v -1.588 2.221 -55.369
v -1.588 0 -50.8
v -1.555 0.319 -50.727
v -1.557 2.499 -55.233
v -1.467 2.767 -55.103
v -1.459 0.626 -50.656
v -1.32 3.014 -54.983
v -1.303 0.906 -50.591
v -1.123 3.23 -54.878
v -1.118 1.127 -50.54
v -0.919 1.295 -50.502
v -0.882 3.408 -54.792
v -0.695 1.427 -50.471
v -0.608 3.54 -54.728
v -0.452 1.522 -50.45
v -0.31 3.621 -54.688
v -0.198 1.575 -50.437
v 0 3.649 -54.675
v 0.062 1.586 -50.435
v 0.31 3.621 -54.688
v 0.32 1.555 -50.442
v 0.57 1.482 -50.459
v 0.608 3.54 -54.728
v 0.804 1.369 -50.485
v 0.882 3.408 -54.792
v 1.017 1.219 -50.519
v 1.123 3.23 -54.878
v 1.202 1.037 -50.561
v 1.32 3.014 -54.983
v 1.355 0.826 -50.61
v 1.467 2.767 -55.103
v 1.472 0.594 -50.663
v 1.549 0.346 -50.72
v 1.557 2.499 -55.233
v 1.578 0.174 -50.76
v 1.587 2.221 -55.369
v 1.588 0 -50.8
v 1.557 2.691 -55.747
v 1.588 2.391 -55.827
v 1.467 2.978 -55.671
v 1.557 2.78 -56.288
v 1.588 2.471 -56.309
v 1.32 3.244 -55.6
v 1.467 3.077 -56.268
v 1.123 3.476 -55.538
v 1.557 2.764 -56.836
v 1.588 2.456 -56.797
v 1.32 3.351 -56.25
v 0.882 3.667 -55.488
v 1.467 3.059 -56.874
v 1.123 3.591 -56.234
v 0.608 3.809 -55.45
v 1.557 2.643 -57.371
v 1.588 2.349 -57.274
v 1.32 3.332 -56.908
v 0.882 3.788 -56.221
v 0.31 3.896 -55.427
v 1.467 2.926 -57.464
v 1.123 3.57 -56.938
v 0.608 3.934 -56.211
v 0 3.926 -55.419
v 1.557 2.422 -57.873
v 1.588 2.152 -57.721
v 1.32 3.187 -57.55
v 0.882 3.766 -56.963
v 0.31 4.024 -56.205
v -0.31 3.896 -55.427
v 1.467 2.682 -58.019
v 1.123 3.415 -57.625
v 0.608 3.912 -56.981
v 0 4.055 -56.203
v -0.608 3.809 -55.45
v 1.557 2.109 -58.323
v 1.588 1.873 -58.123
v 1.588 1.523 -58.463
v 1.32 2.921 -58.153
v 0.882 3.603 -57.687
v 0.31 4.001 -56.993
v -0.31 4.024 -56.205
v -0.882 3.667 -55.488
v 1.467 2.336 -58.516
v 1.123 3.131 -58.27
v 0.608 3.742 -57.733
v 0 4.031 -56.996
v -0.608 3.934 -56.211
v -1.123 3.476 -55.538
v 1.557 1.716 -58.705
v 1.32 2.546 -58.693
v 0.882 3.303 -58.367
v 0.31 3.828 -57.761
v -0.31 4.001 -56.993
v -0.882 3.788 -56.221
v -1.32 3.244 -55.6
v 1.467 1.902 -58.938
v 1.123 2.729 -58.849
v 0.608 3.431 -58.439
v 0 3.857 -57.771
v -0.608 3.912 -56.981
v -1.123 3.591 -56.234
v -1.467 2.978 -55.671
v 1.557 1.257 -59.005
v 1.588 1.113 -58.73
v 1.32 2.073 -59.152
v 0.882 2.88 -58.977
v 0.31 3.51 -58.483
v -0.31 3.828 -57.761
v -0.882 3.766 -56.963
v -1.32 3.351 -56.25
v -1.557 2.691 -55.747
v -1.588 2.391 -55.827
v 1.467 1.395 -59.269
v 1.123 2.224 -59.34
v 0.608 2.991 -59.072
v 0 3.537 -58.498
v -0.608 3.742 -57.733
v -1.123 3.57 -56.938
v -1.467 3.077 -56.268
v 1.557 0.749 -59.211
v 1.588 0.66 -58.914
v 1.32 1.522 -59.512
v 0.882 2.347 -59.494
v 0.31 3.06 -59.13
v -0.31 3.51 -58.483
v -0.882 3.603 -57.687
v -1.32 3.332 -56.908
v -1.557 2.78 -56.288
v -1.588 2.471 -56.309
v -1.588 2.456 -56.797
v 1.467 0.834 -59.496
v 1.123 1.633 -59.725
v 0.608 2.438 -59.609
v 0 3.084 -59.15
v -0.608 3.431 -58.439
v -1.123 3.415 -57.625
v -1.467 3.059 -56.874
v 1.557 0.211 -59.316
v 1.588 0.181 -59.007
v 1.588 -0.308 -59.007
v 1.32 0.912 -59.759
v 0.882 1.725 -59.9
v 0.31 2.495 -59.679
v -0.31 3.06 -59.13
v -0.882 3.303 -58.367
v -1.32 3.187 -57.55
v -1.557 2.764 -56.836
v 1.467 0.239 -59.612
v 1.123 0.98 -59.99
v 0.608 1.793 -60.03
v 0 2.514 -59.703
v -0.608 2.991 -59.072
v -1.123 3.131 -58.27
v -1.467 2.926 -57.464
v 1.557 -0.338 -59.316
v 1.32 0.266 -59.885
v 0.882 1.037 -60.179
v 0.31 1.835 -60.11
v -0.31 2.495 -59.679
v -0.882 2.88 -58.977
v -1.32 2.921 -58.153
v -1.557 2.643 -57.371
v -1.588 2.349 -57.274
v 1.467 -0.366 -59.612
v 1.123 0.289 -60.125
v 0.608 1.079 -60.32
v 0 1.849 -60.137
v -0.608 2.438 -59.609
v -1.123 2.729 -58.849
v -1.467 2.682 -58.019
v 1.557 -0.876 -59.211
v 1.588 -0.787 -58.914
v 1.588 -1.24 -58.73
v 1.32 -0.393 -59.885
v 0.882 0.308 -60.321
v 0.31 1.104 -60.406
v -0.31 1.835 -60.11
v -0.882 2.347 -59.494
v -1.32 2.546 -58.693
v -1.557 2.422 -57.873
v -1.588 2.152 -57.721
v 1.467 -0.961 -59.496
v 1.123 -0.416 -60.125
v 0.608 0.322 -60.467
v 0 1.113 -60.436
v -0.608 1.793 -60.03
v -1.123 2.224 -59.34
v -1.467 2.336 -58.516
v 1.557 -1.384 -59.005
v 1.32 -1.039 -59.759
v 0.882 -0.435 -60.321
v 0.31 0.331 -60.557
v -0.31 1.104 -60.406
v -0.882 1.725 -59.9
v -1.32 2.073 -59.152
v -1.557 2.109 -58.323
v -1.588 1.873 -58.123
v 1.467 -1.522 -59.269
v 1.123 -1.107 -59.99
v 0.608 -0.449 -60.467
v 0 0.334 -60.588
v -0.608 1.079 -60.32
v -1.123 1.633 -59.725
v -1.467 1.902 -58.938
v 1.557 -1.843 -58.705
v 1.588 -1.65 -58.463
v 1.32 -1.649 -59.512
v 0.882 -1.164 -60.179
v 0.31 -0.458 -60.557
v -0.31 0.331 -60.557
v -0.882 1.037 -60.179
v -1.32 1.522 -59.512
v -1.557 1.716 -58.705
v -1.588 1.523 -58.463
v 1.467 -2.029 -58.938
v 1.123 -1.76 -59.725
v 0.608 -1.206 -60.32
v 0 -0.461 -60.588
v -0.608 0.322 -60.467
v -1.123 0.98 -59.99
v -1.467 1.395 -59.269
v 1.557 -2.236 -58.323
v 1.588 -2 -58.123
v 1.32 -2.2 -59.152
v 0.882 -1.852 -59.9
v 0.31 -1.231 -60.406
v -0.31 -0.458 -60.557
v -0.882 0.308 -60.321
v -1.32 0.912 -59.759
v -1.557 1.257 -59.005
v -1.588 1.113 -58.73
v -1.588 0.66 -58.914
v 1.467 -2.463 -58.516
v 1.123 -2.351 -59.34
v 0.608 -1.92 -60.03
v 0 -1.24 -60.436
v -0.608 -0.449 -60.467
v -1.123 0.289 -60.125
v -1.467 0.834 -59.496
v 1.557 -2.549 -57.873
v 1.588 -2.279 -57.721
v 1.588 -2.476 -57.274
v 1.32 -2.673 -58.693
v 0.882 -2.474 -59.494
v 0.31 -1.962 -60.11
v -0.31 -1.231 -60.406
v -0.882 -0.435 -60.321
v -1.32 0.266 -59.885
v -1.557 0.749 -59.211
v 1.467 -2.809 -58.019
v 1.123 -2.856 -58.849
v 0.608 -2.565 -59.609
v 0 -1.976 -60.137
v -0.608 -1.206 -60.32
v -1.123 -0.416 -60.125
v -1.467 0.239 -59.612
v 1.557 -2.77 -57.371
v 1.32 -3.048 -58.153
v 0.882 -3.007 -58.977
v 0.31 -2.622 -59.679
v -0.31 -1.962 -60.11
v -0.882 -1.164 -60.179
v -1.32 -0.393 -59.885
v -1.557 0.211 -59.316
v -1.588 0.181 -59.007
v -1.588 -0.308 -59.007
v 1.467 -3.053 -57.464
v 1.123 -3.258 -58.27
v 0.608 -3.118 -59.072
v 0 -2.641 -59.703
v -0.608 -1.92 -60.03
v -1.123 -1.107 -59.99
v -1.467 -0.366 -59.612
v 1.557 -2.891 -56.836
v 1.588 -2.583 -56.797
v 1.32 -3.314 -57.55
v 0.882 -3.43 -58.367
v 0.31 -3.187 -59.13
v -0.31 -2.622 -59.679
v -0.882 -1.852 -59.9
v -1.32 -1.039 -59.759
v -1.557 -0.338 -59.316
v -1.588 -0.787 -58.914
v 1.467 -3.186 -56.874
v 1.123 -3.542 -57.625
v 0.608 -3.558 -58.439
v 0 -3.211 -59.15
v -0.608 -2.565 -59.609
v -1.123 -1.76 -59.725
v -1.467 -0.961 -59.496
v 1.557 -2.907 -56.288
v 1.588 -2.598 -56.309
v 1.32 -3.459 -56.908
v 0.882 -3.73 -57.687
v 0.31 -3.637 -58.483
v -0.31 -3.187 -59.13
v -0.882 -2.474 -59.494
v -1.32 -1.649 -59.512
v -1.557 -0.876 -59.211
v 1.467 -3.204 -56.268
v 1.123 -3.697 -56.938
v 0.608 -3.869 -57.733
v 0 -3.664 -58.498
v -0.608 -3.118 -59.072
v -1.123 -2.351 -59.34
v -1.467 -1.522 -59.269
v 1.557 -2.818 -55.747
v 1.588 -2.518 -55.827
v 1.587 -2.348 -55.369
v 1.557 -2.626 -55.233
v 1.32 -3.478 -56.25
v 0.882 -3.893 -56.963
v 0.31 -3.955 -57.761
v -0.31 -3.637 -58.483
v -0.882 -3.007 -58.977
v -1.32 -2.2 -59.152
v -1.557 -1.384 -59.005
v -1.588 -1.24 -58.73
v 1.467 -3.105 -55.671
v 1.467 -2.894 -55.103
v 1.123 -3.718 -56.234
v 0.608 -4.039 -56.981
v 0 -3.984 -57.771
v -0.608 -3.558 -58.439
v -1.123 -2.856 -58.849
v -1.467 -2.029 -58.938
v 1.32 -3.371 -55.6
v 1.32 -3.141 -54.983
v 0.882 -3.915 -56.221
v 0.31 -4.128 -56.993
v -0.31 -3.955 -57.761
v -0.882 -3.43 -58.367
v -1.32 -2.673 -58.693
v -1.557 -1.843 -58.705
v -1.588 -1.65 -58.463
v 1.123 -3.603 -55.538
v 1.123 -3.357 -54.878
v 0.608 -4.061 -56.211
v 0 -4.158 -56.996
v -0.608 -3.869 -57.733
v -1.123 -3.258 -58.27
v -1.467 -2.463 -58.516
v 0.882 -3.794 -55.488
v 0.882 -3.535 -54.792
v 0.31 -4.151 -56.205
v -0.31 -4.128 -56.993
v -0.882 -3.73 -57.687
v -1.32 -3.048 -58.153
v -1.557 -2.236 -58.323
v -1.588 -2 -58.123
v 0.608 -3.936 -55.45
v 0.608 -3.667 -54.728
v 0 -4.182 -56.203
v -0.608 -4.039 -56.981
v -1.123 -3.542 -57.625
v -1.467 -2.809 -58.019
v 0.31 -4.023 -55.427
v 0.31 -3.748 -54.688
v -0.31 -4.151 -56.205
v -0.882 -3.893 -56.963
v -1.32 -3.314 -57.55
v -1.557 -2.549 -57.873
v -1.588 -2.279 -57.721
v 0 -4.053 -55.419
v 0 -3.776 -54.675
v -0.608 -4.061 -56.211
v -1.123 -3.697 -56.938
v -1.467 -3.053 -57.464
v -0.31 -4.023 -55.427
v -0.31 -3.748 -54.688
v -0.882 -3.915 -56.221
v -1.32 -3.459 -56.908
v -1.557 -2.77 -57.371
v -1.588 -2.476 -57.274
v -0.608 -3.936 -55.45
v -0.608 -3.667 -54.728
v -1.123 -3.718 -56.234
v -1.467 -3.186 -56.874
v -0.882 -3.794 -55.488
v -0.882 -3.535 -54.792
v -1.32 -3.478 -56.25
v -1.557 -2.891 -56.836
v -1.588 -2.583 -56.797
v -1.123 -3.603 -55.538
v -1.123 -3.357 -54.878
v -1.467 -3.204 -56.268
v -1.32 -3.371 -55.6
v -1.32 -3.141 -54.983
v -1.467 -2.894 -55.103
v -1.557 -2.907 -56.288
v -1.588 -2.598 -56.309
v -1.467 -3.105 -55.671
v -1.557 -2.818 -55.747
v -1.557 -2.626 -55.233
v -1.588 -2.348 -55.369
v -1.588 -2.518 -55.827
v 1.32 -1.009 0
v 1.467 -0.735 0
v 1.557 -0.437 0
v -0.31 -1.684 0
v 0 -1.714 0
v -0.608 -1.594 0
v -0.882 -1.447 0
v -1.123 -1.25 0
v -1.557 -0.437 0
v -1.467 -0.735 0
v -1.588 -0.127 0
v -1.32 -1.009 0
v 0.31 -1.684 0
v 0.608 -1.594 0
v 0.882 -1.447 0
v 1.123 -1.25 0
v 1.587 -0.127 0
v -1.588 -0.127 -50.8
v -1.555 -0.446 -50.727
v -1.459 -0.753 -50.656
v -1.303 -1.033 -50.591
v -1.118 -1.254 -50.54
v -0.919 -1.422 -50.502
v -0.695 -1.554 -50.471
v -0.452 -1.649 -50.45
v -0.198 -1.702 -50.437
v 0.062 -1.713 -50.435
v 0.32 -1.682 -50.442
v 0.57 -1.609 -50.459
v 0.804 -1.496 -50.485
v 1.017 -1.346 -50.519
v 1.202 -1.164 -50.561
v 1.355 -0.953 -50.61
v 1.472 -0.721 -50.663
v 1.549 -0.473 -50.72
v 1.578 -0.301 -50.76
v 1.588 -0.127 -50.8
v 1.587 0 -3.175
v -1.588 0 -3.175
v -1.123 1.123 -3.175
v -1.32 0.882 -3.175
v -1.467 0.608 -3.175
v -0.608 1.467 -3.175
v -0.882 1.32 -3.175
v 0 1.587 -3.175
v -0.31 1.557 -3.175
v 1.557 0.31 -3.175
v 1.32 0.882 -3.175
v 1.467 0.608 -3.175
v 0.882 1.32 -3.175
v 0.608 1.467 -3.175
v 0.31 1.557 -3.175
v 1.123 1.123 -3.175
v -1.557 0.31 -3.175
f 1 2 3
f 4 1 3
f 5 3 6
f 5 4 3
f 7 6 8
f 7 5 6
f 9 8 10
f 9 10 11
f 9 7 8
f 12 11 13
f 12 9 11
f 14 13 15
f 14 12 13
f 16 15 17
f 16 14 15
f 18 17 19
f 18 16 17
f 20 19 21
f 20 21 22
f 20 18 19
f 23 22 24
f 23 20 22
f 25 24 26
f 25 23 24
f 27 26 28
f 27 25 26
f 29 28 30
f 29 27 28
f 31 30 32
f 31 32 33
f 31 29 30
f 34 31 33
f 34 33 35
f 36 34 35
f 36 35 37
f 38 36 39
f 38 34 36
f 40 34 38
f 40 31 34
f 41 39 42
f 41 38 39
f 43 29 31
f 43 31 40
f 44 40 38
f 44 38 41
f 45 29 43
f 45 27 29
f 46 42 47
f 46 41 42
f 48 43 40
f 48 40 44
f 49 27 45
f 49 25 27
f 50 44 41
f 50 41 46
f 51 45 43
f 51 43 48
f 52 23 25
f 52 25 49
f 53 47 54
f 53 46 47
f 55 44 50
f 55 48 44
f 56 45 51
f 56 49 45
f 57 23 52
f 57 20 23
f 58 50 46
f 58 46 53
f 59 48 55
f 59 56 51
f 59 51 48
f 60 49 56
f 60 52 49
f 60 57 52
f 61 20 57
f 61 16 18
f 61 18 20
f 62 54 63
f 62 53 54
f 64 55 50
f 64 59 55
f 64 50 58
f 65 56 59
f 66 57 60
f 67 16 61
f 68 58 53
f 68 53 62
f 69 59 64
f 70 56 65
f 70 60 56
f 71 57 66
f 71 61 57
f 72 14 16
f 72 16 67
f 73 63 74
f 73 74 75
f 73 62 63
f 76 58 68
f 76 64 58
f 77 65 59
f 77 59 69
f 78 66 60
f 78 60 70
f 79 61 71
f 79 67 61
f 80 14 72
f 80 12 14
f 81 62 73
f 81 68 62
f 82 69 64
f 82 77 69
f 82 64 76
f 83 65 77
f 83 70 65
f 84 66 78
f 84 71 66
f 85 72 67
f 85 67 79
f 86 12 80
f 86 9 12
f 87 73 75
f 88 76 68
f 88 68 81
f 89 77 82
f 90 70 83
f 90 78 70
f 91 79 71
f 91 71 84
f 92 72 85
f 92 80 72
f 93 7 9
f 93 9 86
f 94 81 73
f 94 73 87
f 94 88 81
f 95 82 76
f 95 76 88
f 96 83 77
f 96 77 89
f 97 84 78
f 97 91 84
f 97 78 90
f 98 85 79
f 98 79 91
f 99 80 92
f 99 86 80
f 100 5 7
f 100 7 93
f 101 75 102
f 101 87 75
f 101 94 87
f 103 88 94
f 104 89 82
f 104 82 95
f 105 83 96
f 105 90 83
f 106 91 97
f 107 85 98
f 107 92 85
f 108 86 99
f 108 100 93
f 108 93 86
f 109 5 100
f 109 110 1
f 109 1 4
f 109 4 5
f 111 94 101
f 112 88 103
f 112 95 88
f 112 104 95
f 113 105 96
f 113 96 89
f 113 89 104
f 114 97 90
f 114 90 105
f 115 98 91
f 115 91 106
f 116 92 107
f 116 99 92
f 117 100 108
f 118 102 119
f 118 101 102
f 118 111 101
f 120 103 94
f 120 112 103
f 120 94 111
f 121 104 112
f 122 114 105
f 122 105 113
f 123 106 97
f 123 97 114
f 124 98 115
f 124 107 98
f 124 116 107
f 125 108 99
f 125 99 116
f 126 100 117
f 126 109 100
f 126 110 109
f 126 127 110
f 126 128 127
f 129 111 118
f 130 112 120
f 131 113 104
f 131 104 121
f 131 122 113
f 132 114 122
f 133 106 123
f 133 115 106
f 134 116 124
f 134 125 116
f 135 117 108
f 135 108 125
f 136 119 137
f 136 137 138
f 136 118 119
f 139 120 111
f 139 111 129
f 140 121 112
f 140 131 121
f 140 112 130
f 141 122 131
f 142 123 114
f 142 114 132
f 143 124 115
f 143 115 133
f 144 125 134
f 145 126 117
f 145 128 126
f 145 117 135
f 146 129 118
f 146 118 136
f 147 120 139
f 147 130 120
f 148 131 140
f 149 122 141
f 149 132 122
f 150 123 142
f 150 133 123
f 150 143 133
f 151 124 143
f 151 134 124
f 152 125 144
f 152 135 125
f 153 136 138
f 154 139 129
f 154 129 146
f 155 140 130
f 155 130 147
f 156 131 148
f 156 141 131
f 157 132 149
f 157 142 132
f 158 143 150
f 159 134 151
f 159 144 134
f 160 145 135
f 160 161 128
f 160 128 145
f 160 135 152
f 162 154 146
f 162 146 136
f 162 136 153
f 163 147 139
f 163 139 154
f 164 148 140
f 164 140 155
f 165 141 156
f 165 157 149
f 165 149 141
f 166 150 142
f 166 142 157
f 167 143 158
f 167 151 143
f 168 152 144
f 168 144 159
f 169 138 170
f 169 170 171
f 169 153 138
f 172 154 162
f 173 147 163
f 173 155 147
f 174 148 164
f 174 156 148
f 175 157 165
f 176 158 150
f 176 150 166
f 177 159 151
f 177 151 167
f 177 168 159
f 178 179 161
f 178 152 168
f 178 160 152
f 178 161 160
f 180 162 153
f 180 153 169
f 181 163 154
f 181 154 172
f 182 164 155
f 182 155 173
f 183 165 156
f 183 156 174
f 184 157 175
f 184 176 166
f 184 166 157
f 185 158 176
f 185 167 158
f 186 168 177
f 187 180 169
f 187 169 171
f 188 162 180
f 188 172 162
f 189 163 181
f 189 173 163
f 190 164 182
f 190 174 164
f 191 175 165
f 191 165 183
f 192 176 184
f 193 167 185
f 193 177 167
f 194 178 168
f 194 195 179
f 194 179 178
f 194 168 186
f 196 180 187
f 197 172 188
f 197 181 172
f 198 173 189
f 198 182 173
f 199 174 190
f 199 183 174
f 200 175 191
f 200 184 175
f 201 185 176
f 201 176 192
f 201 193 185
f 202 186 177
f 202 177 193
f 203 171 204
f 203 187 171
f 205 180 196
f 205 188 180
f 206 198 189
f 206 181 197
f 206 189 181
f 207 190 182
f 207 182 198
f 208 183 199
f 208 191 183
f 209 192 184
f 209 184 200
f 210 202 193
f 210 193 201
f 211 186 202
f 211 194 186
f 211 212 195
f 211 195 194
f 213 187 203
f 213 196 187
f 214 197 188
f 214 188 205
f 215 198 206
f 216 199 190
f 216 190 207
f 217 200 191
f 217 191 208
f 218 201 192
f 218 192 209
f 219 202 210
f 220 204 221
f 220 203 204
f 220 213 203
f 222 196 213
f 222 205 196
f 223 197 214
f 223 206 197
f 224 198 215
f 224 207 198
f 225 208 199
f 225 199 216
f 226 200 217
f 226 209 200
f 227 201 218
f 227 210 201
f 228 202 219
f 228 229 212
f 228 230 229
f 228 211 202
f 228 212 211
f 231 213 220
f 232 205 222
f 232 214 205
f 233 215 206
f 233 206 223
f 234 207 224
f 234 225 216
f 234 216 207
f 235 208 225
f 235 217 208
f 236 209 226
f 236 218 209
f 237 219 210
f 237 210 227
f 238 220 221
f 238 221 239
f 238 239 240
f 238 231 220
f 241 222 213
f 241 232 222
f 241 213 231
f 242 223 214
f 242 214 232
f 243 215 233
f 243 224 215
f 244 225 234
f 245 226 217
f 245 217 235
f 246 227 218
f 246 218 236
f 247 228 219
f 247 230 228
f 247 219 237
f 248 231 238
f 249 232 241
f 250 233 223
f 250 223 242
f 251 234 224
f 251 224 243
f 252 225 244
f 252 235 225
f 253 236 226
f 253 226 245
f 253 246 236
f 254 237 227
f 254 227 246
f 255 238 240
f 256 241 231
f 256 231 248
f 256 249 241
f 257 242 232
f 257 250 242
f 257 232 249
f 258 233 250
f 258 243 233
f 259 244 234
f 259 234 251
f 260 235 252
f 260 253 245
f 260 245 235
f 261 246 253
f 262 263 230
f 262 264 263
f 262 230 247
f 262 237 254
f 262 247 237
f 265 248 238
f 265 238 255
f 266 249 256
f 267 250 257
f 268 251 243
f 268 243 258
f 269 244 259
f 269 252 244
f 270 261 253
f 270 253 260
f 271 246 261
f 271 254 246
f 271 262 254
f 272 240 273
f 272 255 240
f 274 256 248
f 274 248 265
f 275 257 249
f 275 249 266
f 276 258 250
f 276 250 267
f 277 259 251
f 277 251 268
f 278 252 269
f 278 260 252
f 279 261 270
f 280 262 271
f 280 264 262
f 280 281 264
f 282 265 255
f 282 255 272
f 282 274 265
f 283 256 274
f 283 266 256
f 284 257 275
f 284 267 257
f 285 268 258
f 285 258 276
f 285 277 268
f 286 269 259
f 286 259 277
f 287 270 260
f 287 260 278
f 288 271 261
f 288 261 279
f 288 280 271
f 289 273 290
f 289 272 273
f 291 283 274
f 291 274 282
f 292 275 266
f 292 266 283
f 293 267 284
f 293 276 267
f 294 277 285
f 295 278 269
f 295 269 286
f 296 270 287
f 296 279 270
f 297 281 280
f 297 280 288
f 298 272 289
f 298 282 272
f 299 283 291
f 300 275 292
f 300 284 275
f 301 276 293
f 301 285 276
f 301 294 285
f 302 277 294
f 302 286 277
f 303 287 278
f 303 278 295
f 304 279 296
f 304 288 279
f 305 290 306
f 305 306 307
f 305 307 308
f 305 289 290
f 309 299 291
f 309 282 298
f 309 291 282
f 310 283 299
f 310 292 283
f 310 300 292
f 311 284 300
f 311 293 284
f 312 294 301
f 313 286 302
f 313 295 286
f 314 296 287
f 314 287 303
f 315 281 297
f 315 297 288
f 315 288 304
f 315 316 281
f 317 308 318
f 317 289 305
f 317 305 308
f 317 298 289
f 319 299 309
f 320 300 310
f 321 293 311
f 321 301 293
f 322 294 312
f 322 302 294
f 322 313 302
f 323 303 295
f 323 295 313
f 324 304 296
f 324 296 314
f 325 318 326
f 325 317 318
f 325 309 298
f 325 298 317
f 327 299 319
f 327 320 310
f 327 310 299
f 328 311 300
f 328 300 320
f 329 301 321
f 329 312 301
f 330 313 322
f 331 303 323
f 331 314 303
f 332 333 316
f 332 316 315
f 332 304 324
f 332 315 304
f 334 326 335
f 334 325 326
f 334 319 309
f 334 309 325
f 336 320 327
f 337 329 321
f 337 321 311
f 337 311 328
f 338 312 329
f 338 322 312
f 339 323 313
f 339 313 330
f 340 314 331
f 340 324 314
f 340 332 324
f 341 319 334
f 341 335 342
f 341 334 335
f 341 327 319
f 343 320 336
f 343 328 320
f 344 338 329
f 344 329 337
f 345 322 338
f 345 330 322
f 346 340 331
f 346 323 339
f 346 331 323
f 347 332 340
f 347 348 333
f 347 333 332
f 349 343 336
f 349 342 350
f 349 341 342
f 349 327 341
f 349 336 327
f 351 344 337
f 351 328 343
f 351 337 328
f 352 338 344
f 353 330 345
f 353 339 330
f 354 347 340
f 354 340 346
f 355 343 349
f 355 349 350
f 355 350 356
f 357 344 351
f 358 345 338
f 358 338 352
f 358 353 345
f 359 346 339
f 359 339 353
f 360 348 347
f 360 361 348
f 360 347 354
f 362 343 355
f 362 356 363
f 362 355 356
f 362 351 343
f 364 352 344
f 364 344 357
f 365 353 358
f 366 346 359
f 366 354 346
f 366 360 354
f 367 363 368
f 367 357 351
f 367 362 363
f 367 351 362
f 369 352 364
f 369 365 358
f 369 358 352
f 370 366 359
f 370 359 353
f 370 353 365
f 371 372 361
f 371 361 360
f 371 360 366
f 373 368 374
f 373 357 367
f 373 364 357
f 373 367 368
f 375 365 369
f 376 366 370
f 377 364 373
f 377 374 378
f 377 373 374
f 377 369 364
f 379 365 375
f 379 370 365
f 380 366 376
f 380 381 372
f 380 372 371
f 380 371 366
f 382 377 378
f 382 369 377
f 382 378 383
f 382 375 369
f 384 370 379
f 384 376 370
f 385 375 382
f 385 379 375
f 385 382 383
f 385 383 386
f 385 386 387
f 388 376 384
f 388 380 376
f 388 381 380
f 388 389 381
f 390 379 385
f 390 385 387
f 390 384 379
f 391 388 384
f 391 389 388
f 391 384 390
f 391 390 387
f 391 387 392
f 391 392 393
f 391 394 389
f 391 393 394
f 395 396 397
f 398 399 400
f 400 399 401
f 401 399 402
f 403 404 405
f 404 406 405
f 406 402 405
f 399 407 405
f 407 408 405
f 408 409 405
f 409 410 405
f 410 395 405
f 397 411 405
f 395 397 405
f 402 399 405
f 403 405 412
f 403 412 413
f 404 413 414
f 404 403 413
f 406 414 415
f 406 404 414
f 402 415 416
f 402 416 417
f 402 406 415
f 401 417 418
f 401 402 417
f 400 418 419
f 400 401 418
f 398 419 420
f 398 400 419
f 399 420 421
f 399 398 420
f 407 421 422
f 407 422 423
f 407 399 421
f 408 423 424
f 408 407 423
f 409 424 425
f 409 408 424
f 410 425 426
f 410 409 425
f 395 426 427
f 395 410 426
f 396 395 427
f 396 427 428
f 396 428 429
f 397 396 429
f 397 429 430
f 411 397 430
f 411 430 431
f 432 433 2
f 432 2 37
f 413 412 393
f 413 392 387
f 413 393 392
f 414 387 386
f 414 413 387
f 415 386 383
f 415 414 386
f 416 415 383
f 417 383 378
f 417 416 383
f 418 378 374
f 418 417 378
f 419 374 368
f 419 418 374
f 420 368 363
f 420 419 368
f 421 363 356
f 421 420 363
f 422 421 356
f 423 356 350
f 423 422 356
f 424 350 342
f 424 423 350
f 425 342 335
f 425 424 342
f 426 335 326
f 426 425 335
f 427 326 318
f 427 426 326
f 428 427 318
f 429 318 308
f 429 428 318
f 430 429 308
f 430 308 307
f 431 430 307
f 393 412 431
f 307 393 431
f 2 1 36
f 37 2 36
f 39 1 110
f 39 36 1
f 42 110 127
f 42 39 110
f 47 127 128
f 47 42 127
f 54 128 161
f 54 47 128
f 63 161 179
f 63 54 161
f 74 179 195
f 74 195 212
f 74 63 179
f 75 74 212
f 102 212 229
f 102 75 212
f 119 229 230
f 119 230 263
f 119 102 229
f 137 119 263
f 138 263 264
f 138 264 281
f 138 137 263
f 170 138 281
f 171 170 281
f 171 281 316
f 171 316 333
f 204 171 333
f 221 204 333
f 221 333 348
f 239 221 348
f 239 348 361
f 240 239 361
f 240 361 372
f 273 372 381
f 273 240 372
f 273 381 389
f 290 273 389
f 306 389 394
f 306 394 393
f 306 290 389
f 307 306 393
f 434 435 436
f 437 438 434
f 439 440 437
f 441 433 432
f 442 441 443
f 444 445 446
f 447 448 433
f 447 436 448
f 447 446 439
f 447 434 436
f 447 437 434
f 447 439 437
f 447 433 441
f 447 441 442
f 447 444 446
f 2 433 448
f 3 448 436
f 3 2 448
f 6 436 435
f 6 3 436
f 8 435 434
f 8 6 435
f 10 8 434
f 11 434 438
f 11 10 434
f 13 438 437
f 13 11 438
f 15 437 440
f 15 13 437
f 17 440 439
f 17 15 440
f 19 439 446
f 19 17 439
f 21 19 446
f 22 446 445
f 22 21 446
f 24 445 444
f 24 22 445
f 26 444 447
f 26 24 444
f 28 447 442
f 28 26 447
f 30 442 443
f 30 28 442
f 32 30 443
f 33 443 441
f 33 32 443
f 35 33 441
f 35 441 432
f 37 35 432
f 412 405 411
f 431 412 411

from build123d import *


with BuildPart() as part:
    # Sweep2: sweep along a path in Sketch2
    with BuildLine(Plane(origin=(0, 0, 0), x_dir=(0, 0, -1), z_dir=(1, 0, 0))) as sweep2_path:
        Line((3.175, 0), (50.8, 0))
        Line((50.8, 0), (55.368806141, 2.22090307))
        ThreePointArc((55.368806141, 2.22090307), (59.019257676, -0.0635), (55.368806141, -2.34790307))
        Line((55.368806141, -2.34790307), (50.8, -0.127))
        Line((50.8, -0.127), (0, -0.127))
    # Sketch3 → Sweep2 (sweep)
    with BuildSketch(Plane.XY.offset(-3.175)):
        with BuildLine():
            Line((-1.5875, 0), (1.5875, 0))
            ThreePointArc((1.5875, 0), (0, 1.5875), (-1.5875, 0))
        make_face()
    sweep(path=sweep2_path.line, transition=Transition.RIGHT)


solid = part.part
